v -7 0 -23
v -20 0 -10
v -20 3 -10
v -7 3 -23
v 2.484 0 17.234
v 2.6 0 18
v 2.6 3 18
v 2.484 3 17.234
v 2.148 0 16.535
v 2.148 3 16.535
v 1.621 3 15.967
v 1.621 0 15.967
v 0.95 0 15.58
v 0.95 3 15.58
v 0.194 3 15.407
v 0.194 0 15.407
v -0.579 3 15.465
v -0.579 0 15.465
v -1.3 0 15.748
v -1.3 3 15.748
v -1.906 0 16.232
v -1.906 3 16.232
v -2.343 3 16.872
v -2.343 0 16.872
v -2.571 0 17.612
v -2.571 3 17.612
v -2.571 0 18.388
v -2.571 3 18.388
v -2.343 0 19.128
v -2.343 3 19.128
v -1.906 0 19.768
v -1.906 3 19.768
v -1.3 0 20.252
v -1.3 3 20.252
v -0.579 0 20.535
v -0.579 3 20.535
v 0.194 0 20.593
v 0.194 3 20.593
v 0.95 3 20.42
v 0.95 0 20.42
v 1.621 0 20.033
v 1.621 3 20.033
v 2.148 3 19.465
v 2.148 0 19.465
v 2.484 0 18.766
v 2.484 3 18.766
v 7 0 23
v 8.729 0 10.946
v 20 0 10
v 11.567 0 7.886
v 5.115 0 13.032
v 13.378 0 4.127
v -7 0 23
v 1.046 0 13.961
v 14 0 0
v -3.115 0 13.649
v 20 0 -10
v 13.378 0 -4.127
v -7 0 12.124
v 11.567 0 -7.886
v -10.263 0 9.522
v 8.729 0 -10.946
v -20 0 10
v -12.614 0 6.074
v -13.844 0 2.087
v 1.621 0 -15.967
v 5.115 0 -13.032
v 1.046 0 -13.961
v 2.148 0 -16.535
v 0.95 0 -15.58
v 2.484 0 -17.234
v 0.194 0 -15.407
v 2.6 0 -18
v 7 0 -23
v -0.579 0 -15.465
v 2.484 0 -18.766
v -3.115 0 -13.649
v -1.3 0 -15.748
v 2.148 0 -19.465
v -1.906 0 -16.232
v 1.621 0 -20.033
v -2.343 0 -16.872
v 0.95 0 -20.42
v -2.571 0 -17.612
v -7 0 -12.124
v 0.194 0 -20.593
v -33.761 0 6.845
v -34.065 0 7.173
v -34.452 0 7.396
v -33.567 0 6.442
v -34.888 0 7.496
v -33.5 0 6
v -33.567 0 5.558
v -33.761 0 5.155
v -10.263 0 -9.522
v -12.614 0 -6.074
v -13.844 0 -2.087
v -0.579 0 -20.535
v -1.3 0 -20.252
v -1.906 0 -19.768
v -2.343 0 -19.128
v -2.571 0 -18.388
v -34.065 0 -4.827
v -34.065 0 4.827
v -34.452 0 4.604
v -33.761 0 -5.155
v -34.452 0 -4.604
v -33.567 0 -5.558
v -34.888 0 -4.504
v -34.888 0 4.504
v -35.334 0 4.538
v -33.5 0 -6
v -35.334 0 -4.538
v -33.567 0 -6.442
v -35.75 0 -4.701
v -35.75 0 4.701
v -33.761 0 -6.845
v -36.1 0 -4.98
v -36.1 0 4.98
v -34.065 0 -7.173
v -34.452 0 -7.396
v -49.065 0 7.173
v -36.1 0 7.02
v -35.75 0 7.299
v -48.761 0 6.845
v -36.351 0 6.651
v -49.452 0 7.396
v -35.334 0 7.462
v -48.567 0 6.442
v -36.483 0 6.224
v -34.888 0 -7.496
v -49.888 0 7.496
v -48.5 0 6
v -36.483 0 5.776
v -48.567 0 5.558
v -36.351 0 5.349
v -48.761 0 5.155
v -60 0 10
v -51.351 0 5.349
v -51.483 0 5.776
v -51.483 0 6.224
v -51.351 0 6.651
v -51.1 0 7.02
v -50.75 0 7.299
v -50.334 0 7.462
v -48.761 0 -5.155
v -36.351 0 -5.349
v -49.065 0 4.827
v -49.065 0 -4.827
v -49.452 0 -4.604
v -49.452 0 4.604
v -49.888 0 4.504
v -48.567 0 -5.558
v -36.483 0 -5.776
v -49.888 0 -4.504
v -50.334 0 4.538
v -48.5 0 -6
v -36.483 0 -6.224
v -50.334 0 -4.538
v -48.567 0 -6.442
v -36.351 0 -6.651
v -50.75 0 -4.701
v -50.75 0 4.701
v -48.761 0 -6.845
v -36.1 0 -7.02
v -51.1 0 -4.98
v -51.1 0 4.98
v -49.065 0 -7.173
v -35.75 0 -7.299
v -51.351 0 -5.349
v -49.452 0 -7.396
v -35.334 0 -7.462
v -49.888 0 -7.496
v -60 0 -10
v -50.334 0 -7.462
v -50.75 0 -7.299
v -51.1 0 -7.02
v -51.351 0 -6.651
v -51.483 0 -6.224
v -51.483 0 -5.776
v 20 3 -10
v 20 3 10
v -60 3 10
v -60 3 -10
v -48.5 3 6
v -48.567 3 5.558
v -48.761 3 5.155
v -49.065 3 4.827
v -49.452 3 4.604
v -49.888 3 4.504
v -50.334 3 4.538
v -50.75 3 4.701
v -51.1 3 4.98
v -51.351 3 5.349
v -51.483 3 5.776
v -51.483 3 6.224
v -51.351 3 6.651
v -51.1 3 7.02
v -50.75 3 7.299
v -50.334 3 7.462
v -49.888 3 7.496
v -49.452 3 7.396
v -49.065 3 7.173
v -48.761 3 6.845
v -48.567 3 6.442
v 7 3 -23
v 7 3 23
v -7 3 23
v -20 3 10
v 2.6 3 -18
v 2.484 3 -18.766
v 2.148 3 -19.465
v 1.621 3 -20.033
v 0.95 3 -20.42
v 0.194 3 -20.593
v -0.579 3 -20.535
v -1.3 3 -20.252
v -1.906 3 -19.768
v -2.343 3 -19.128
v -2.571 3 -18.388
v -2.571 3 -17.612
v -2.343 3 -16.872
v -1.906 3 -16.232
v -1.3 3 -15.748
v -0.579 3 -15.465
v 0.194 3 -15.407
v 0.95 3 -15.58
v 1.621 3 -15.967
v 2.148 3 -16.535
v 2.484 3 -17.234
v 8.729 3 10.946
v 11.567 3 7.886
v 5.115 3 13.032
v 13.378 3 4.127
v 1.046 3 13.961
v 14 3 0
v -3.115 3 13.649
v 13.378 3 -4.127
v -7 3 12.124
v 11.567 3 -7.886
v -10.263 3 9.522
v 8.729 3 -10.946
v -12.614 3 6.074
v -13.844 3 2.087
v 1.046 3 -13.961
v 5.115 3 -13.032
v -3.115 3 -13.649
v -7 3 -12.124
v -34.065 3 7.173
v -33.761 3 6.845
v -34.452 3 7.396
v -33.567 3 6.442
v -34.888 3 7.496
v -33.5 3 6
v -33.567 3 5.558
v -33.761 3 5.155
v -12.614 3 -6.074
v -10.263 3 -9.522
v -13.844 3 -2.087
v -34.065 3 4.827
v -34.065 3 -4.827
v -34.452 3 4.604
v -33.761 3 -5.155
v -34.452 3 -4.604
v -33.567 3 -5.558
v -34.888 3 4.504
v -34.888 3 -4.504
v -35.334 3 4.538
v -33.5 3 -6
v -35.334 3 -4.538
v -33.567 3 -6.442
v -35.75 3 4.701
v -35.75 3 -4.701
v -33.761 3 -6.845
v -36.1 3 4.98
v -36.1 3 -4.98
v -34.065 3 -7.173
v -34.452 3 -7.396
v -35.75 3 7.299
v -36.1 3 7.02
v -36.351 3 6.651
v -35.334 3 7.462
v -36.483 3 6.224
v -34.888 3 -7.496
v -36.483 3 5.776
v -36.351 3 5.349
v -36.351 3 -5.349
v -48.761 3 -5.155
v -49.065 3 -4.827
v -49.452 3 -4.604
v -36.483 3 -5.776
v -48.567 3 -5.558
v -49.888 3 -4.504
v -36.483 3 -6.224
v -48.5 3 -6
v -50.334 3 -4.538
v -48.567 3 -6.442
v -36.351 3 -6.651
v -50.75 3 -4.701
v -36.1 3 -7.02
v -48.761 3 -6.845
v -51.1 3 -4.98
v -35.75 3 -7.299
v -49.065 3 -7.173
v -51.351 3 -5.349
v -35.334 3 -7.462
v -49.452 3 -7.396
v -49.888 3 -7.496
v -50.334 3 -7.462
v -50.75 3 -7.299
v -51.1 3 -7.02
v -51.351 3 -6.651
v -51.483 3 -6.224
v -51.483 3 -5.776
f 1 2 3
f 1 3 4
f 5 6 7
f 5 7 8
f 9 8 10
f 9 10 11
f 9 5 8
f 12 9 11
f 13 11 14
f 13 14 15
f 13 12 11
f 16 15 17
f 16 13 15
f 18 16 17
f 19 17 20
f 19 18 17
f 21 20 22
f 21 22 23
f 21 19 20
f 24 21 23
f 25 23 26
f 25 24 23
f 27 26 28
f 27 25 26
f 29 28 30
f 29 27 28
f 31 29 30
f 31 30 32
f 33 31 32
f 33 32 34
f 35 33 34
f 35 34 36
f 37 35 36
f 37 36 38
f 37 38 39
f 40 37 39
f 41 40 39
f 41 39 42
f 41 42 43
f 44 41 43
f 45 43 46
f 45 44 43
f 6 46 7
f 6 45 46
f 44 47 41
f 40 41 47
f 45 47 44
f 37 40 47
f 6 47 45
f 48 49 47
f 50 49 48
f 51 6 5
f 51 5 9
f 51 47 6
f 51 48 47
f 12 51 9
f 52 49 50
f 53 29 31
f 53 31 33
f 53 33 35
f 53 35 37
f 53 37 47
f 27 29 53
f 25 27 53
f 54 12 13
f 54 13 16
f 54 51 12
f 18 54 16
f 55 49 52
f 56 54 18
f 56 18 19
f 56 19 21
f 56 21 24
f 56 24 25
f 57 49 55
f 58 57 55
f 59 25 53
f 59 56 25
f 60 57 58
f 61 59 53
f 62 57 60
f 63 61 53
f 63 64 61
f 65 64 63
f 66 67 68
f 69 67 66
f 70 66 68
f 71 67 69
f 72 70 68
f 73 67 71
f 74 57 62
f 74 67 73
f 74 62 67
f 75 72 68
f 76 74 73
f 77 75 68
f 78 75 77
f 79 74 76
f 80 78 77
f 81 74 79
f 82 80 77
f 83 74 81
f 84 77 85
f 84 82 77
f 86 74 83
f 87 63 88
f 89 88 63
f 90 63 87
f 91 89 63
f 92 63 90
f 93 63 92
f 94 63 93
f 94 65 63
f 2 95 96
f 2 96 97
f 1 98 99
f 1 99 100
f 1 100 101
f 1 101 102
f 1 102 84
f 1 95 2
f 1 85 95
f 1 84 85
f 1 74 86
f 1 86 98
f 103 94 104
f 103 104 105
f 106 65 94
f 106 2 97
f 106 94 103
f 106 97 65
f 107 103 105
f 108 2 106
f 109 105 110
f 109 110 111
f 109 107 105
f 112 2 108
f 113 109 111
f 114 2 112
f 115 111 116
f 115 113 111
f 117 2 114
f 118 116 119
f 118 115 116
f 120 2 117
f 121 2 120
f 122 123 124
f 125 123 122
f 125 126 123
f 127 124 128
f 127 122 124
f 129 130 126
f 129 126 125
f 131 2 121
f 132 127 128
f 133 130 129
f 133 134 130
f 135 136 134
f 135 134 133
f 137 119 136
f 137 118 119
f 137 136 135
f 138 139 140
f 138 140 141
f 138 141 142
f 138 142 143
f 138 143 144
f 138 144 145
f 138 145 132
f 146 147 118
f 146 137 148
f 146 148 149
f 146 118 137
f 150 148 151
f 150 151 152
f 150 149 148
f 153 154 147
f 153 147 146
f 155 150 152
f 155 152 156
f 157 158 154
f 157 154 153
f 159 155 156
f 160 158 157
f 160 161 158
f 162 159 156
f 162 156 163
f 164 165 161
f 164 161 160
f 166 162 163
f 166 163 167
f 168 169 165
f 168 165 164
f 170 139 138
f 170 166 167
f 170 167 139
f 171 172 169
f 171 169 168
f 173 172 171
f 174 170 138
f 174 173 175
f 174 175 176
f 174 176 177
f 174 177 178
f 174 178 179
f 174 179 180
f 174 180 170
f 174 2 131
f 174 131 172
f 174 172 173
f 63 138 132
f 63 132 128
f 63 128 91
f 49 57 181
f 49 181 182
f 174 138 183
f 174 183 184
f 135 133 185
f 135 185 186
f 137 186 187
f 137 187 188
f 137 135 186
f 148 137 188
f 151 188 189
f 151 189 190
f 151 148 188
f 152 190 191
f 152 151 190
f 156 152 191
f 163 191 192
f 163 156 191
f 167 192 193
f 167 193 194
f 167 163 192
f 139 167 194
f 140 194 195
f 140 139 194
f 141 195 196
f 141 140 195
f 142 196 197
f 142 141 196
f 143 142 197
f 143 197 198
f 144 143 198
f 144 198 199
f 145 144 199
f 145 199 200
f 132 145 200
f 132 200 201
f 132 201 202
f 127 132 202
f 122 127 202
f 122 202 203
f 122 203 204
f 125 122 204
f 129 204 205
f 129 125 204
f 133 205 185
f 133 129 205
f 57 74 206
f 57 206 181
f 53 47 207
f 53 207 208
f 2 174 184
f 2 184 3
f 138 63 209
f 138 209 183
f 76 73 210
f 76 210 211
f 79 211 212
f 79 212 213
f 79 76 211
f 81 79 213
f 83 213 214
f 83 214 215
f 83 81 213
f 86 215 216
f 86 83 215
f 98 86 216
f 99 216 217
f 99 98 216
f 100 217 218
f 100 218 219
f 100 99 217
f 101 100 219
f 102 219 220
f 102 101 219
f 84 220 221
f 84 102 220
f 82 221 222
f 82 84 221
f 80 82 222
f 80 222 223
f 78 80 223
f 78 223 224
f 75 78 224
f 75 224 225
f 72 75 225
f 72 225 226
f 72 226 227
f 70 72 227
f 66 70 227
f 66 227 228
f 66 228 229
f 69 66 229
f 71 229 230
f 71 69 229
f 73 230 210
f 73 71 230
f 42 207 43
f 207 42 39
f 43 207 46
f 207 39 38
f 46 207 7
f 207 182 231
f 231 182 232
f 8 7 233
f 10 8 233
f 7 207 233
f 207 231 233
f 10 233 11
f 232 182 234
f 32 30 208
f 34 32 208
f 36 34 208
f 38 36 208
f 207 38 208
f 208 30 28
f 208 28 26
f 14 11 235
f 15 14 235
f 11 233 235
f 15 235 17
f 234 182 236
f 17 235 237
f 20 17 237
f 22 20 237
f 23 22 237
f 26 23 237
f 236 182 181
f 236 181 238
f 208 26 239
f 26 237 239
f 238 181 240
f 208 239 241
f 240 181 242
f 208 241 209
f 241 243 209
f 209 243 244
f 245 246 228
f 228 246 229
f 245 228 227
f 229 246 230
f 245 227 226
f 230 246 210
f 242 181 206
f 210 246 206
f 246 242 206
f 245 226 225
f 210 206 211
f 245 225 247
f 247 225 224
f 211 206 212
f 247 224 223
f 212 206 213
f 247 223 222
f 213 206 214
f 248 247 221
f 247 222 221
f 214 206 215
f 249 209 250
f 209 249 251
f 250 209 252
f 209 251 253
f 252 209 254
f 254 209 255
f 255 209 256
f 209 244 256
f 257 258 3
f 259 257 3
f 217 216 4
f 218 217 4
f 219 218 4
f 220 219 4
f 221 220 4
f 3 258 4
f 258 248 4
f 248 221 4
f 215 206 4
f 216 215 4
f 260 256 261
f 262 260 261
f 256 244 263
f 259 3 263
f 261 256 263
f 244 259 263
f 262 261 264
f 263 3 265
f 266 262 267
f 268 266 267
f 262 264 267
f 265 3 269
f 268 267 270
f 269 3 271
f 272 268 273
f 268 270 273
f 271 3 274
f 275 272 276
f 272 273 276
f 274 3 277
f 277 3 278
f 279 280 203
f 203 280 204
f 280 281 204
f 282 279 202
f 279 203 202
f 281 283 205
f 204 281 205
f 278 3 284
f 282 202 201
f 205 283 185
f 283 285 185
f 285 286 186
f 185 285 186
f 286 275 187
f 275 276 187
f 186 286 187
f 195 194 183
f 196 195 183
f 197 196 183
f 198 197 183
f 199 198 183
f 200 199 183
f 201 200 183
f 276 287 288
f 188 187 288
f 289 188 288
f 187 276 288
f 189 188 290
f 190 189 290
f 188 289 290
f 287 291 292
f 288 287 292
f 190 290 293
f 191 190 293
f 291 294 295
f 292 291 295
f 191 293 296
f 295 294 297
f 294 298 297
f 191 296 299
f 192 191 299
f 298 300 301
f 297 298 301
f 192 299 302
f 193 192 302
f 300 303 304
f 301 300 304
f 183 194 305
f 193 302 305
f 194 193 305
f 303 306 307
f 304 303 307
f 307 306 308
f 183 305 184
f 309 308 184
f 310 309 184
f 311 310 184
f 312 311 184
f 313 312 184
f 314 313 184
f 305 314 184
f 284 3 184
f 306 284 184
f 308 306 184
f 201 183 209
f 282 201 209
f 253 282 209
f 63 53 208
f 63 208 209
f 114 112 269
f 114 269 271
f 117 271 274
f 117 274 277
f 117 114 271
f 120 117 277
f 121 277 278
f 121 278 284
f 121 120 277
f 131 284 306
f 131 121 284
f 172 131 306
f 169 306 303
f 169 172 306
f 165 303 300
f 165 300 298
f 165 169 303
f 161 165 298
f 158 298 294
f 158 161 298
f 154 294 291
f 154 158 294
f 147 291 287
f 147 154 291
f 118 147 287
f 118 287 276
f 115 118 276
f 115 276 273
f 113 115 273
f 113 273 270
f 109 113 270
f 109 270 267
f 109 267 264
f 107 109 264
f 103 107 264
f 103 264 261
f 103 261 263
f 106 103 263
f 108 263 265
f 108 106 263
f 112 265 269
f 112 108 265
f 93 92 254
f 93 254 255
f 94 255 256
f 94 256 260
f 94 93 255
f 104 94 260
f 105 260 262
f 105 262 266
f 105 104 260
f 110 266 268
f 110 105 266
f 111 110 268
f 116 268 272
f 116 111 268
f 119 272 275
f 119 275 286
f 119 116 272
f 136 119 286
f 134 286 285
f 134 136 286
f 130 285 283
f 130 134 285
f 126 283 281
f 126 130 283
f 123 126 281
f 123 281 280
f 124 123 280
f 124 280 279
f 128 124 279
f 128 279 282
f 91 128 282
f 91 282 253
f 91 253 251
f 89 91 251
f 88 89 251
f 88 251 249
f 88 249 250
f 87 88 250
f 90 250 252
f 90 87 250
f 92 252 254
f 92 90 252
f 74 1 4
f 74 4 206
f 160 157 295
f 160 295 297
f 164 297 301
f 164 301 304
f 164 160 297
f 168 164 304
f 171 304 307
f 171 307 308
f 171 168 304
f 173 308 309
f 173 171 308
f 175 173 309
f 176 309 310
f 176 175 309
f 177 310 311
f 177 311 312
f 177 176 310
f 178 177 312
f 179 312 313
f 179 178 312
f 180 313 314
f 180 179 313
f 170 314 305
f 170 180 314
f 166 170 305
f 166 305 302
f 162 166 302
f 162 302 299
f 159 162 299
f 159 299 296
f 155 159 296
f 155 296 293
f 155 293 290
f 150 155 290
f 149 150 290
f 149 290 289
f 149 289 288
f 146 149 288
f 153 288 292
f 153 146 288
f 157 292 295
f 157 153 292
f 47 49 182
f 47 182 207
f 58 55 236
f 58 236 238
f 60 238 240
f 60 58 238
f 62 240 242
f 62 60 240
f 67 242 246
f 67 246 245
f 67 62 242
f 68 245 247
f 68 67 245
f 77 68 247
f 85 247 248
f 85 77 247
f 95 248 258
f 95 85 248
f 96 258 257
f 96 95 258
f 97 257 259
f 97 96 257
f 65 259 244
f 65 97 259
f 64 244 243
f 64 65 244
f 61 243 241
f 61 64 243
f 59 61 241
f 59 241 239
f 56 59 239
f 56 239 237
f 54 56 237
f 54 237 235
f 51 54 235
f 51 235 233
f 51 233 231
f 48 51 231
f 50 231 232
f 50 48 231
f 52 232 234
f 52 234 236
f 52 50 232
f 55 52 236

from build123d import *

# Parameters (mm, degrees)
SKETCH_1_R      = 1.5
SKETCH_1_R_2    = 14
SKETCH_1_R_3    = 2.6
EXTRUDE_1_DEPTH = 3


with BuildPart() as part:
    # 草图1 → 凸台-拉伸1 (new body)
    with BuildSketch(Plane(origin=(0, 0, 0), x_dir=(1, 0, 0), z_dir=(0, 1, 0))):
        Polygon((-60, 10), (-20, 10), (-7, 23), (7, 23), (20, 10), (20, -10), (7, -23), (-7, -23), (-20, -10), (-60, -10), align=None)
        with Locations((-35, 6)):
            Circle(SKETCH_1_R, mode=Mode.SUBTRACT)
        with Locations((-50, 6)):
            Circle(SKETCH_1_R, mode=Mode.SUBTRACT)
        with Locations((-35, -6)):
            Circle(SKETCH_1_R, mode=Mode.SUBTRACT)
        with Locations((-50, -6)):
            Circle(SKETCH_1_R, mode=Mode.SUBTRACT)
        Circle(SKETCH_1_R_2, mode=Mode.SUBTRACT)
        with Locations((0, 18)):
            Circle(SKETCH_1_R_3, mode=Mode.SUBTRACT)
        with Locations((0, -18)):
            Circle(SKETCH_1_R_3, mode=Mode.SUBTRACT)
    extrude(amount=EXTRUDE_1_DEPTH)


solid = part.part
